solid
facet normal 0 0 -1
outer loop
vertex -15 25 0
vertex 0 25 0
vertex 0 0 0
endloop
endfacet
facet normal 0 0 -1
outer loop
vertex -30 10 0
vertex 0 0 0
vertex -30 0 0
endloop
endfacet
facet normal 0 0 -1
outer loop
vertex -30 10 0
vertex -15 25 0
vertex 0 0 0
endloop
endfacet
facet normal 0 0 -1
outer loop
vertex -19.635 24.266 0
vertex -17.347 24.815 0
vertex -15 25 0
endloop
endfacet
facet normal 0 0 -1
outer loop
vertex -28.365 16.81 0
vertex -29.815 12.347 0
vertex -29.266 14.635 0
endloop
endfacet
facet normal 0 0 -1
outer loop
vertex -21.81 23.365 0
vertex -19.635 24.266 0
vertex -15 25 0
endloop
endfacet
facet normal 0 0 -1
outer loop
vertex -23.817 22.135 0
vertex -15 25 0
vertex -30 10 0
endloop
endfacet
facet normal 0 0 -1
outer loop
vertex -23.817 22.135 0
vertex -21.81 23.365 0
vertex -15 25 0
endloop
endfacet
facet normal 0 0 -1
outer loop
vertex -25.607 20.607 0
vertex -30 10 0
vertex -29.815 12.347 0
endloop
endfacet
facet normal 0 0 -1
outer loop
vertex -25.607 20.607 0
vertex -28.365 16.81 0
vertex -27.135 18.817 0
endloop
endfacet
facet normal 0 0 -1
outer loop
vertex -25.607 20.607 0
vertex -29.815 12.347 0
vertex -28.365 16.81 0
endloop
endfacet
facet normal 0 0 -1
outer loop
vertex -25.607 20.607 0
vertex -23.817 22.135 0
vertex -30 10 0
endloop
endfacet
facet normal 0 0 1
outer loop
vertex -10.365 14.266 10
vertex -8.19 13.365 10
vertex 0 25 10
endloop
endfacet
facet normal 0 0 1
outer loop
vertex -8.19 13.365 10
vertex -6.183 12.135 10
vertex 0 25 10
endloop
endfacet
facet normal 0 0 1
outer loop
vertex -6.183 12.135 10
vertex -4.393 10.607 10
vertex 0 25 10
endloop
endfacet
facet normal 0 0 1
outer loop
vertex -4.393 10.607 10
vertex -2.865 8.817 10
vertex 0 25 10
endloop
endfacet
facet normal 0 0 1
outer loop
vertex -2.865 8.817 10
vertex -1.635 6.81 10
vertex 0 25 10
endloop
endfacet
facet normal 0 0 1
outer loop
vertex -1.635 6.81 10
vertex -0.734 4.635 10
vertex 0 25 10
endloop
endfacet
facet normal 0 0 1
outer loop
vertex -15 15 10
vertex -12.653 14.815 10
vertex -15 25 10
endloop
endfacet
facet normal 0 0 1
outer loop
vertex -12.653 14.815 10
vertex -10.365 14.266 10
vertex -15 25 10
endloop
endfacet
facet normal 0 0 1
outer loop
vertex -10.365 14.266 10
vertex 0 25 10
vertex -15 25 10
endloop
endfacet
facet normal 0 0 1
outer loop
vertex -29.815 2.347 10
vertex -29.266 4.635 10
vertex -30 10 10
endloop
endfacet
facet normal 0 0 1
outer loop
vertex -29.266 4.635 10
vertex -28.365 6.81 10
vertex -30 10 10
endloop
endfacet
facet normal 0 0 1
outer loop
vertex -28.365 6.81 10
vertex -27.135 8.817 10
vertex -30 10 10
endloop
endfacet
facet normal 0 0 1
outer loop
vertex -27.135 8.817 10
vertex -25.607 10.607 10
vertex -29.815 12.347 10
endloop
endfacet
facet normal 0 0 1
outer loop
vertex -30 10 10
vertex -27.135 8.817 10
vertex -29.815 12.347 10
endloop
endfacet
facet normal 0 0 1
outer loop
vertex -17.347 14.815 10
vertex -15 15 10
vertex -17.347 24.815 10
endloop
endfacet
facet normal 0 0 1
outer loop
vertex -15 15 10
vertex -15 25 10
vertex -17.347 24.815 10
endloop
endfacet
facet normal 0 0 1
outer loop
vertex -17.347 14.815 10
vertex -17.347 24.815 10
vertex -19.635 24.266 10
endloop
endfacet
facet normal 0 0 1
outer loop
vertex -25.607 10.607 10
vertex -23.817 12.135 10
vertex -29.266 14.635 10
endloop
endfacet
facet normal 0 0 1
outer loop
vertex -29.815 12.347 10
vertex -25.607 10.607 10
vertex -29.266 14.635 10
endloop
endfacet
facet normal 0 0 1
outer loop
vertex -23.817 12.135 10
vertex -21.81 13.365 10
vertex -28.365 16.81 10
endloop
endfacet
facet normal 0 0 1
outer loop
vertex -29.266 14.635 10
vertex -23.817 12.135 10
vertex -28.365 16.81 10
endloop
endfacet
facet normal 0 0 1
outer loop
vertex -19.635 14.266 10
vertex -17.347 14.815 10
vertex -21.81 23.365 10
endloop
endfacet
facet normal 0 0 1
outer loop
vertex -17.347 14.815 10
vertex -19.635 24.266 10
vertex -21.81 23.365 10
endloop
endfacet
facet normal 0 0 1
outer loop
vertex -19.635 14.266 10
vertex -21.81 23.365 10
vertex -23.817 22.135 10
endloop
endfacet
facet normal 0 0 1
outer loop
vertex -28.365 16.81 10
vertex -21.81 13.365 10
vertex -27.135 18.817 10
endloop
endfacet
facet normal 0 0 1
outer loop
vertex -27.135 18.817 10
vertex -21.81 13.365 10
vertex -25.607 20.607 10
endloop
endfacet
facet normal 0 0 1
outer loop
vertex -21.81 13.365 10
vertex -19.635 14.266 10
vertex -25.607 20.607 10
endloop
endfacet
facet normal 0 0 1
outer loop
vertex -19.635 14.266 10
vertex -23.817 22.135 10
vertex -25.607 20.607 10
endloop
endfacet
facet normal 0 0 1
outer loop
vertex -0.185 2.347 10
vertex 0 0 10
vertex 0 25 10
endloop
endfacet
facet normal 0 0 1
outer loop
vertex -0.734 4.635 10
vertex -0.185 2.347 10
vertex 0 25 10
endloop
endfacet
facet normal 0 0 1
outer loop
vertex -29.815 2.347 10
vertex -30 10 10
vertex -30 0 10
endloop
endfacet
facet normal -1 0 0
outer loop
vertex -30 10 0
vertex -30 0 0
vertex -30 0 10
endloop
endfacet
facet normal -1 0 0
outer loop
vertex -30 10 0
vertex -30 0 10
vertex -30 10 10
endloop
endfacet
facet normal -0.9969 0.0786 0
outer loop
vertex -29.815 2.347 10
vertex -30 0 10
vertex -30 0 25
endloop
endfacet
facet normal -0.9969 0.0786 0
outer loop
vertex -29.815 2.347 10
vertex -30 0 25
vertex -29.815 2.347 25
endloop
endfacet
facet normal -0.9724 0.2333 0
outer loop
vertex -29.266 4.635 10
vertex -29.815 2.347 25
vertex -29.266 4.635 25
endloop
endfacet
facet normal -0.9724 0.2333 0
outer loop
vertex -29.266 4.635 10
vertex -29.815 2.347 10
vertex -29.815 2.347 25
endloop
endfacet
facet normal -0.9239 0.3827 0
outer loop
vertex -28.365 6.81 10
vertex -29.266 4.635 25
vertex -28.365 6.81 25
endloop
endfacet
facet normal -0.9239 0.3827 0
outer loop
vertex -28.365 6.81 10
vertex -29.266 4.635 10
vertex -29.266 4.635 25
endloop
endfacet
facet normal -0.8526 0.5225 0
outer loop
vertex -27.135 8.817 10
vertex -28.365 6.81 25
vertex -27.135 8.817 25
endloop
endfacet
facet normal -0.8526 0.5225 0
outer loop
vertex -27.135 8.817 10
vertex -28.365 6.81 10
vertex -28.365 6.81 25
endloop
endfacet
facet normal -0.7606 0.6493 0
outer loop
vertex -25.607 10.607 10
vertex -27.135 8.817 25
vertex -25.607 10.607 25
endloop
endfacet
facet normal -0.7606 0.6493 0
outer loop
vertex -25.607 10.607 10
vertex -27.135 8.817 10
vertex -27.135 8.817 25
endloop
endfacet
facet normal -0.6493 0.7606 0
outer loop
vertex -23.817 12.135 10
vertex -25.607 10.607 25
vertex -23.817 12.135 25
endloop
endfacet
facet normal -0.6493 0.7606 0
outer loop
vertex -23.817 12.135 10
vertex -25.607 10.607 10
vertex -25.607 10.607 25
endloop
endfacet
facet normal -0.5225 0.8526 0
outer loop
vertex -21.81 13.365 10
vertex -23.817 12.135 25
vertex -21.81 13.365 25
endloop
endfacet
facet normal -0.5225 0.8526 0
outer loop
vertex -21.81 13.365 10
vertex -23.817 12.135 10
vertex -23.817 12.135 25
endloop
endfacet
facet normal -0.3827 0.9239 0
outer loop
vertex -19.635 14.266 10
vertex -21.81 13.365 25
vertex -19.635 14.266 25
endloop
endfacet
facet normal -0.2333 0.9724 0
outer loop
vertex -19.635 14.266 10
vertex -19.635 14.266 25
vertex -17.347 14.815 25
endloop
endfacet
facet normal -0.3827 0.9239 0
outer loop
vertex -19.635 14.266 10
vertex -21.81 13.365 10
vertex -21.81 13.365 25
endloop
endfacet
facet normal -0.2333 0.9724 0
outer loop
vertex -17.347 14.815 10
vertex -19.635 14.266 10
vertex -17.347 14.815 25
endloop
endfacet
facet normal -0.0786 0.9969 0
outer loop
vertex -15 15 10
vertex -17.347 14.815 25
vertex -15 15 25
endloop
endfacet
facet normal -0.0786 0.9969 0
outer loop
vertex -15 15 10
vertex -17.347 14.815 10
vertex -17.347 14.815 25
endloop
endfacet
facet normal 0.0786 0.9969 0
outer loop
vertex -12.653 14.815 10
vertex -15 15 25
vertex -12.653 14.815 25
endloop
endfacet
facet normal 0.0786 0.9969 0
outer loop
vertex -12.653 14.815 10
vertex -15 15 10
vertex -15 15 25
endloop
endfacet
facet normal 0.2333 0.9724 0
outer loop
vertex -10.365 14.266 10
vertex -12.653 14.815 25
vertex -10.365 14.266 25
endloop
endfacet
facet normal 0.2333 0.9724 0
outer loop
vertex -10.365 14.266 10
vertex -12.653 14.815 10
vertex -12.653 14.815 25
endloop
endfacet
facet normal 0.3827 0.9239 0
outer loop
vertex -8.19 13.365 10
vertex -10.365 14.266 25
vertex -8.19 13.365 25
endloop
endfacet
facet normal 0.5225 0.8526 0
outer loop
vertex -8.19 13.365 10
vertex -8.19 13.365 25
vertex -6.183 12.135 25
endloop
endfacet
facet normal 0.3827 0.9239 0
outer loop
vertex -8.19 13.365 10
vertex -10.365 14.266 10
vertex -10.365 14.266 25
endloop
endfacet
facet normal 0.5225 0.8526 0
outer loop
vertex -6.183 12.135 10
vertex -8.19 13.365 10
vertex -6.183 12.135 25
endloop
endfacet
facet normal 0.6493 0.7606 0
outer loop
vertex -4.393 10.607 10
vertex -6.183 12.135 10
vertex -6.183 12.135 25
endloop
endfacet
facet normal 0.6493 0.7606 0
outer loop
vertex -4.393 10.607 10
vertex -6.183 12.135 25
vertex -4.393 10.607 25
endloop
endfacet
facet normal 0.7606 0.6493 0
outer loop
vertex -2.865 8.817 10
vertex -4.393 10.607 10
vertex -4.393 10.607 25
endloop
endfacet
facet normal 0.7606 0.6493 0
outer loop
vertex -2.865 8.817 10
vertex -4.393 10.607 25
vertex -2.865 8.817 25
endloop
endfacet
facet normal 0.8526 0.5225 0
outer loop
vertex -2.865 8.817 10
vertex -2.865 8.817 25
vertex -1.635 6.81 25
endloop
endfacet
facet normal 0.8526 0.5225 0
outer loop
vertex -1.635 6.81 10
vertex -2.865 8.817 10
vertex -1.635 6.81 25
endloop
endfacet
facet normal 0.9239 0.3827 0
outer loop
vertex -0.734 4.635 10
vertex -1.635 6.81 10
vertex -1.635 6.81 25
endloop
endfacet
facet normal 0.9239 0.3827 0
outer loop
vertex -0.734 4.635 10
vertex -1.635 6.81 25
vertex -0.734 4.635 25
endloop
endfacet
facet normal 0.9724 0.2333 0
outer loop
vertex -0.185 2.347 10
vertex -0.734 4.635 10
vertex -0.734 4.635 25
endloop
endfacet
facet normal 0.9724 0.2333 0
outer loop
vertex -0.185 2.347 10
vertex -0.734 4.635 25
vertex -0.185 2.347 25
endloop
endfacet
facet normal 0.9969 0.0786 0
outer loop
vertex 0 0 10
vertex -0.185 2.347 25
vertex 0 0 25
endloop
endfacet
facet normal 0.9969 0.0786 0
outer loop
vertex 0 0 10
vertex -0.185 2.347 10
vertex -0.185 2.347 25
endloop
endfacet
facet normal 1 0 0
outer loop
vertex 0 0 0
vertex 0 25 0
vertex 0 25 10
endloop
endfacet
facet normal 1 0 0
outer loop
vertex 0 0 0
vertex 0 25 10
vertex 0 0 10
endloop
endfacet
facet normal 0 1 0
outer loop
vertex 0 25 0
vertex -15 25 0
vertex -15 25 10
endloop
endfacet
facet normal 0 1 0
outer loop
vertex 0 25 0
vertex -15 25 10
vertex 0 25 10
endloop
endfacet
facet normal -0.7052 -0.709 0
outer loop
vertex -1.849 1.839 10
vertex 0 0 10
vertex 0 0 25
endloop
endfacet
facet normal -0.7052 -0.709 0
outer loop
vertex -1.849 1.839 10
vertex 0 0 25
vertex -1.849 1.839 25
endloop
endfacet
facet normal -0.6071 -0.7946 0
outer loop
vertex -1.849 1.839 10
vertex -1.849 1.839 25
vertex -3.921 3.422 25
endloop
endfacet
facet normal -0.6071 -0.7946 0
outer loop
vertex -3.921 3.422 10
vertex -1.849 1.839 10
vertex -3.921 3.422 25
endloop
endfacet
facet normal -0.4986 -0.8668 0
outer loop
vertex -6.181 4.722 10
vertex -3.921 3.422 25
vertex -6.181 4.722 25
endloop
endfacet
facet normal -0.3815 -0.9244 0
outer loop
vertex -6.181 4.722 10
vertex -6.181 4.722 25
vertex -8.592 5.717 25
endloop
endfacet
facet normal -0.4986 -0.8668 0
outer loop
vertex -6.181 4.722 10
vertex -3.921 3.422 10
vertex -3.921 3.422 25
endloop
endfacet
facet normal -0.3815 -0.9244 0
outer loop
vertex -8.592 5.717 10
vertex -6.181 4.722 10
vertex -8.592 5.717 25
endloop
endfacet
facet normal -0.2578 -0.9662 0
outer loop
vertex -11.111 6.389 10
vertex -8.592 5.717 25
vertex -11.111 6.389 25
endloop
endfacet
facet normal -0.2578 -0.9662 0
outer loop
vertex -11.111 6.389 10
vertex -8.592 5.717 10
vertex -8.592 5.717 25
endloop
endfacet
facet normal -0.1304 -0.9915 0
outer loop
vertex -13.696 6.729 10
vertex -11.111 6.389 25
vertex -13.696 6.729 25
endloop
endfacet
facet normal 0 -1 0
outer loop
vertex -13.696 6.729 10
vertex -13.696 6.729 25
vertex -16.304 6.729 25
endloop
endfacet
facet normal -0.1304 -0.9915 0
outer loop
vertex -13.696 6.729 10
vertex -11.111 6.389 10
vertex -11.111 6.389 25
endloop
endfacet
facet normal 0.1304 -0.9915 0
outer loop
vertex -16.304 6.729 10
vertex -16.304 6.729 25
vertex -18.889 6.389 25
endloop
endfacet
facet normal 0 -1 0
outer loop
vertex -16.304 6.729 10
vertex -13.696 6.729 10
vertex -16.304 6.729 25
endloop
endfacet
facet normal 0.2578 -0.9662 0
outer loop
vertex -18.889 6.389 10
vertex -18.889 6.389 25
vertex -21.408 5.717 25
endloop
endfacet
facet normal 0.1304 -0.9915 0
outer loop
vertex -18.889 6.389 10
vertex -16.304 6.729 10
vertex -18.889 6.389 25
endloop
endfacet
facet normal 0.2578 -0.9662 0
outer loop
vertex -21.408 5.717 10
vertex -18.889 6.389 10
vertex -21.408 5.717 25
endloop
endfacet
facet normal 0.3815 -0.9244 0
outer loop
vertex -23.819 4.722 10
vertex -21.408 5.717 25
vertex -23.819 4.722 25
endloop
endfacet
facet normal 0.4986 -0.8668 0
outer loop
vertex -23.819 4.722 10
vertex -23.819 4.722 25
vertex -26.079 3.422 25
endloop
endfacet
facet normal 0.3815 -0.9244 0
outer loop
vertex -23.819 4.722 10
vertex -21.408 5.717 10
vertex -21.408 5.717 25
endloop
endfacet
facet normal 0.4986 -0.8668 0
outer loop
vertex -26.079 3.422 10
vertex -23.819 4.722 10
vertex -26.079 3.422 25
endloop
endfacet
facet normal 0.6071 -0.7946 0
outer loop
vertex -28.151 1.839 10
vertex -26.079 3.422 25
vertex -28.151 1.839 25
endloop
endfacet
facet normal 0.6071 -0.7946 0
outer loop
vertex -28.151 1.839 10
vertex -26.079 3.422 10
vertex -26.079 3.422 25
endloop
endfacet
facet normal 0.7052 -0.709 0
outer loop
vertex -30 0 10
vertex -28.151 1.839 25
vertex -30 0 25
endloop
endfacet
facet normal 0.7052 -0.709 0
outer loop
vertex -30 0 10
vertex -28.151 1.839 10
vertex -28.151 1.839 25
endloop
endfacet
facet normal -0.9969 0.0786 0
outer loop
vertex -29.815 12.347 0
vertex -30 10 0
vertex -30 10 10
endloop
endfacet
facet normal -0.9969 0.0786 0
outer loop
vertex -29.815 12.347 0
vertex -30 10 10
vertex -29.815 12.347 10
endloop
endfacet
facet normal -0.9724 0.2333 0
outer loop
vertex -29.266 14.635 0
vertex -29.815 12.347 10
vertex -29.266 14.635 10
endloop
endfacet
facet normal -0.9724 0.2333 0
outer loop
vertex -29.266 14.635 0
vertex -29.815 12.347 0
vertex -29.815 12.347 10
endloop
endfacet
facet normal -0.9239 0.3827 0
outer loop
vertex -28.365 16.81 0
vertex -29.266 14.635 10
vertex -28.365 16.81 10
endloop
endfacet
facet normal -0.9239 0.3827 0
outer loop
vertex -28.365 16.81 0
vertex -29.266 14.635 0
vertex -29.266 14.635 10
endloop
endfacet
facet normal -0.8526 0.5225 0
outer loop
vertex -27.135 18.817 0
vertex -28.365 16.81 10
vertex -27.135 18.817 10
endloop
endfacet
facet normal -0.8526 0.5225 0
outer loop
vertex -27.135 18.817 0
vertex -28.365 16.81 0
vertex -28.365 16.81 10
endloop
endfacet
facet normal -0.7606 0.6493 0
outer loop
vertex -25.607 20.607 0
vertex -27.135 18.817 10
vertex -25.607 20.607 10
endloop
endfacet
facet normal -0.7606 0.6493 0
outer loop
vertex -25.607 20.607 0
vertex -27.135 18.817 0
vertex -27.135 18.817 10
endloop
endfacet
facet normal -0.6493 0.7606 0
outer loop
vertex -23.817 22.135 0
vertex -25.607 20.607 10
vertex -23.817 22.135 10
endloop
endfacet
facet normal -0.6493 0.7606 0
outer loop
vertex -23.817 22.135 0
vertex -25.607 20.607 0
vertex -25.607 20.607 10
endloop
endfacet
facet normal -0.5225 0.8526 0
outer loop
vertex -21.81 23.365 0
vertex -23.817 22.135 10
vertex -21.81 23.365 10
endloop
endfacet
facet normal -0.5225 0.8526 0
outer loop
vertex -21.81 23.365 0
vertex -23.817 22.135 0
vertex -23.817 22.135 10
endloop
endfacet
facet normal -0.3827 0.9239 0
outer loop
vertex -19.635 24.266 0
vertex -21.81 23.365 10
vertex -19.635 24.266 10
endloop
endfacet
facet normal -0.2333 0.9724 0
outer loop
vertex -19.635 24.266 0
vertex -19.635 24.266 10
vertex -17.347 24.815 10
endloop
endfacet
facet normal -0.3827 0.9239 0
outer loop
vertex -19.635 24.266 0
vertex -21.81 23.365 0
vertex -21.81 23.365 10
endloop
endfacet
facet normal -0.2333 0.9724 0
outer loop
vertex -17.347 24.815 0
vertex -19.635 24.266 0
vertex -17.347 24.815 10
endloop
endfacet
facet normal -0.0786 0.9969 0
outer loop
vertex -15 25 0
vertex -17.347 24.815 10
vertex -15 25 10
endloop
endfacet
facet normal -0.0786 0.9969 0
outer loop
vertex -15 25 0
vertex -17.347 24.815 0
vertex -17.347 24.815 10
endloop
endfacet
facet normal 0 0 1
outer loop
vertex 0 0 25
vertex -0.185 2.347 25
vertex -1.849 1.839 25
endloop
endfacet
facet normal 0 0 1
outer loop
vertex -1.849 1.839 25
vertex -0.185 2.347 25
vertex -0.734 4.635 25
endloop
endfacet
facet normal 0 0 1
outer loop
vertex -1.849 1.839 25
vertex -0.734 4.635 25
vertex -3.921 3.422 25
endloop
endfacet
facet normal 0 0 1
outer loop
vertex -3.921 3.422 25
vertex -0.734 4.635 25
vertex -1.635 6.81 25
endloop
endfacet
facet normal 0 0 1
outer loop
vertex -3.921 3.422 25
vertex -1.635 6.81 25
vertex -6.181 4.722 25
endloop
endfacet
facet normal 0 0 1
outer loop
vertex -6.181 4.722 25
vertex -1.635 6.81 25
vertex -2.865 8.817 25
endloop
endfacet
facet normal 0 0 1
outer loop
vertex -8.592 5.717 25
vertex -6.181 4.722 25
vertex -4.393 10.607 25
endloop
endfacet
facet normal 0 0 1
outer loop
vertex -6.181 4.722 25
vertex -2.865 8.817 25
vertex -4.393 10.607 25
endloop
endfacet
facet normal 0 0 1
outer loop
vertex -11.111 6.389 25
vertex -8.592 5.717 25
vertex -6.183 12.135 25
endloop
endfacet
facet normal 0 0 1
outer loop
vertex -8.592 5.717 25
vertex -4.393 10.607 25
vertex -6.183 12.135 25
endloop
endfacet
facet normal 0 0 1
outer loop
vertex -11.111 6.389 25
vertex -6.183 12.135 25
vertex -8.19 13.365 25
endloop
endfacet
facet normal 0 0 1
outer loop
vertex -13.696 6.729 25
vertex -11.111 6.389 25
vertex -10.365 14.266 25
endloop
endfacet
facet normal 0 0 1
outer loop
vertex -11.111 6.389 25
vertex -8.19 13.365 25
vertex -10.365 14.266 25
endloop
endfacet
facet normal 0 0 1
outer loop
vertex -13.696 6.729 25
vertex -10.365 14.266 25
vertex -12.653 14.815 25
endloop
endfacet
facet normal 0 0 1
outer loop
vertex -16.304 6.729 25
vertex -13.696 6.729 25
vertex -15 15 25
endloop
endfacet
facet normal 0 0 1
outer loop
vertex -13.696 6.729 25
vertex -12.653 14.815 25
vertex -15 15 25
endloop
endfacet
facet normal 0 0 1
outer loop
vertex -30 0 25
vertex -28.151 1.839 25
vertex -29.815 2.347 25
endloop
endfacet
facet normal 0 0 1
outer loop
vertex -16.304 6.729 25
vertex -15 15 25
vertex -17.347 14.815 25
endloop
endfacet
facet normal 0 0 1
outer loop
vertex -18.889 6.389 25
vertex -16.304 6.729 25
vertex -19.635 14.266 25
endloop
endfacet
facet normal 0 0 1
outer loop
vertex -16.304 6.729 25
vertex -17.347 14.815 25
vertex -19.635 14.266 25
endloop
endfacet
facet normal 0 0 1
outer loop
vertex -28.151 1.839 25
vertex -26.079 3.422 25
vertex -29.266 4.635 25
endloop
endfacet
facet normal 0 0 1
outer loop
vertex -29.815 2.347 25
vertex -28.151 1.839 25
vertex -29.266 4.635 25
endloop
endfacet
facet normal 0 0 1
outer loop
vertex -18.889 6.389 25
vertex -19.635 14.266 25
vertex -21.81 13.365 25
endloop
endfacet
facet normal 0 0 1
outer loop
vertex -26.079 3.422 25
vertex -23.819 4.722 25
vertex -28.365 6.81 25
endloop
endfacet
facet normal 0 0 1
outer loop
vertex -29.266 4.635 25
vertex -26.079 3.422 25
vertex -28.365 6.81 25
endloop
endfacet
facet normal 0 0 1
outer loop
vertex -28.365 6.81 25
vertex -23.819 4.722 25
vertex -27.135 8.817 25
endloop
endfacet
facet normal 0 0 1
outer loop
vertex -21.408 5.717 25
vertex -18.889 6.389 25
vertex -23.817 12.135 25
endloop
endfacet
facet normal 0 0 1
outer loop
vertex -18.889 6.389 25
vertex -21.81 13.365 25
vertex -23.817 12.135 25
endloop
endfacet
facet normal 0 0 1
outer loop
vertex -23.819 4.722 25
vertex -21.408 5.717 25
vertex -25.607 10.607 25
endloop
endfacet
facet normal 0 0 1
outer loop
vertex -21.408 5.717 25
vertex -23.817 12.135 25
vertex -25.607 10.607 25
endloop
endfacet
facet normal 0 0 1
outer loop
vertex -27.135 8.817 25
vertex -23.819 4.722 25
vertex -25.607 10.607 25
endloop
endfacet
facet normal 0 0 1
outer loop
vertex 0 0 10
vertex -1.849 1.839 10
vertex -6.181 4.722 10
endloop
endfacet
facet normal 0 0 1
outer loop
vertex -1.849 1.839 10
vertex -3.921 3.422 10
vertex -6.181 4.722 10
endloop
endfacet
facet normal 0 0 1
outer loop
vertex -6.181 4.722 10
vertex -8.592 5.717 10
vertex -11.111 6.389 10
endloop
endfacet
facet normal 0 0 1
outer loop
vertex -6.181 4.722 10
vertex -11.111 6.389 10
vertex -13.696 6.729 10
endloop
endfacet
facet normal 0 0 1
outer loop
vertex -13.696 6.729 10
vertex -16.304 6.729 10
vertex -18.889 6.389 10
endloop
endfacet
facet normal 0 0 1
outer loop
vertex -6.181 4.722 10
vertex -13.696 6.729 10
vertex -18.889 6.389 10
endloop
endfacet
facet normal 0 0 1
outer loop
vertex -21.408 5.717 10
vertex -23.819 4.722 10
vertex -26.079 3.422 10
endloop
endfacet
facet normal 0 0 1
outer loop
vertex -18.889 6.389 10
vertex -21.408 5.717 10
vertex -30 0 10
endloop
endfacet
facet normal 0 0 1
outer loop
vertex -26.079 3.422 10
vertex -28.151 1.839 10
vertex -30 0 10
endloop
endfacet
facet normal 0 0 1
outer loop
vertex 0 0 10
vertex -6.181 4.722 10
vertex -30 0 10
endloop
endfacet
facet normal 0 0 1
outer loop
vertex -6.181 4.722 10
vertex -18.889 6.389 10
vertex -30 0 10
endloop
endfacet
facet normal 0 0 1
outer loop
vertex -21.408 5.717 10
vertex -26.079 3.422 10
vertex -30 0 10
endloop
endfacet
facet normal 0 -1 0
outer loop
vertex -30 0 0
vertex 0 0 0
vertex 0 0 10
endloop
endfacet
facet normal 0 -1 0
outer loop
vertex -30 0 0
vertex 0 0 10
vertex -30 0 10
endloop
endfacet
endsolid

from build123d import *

# Parameters (mm, degrees)
BOSS_EXTRUDE1_DEPTH = 10
BOSS_EXTRUDE2_DEPTH = 15


with BuildPart() as part:
    # Sketch1 → Boss-Extrude1 (new body)
    with BuildSketch(Plane.XY):
        with BuildLine():
            Line((-15, 25), (0, 25))
            Line((0, 25), (0, 0))
            Line((0, 0), (-30, 0))
            Line((-30, 0), (-30, 10))
            ThreePointArc((-30, 10), (-25.606601718, 20.606601718), (-15, 25))
        make_face()
    extrude(amount=BOSS_EXTRUDE1_DEPTH)

    # Sketch2 → Boss-Extrude2 (add)
    with BuildSketch(Plane.XY.offset(10)):
        with BuildLine():
            ThreePointArc((-30, 0), (-15, 15), (0, 0))
            ThreePointArc((0, 0), (-15, 6.771243445), (-30, 0))
        make_face()
    extrude(amount=BOSS_EXTRUDE2_DEPTH)


solid = part.part
